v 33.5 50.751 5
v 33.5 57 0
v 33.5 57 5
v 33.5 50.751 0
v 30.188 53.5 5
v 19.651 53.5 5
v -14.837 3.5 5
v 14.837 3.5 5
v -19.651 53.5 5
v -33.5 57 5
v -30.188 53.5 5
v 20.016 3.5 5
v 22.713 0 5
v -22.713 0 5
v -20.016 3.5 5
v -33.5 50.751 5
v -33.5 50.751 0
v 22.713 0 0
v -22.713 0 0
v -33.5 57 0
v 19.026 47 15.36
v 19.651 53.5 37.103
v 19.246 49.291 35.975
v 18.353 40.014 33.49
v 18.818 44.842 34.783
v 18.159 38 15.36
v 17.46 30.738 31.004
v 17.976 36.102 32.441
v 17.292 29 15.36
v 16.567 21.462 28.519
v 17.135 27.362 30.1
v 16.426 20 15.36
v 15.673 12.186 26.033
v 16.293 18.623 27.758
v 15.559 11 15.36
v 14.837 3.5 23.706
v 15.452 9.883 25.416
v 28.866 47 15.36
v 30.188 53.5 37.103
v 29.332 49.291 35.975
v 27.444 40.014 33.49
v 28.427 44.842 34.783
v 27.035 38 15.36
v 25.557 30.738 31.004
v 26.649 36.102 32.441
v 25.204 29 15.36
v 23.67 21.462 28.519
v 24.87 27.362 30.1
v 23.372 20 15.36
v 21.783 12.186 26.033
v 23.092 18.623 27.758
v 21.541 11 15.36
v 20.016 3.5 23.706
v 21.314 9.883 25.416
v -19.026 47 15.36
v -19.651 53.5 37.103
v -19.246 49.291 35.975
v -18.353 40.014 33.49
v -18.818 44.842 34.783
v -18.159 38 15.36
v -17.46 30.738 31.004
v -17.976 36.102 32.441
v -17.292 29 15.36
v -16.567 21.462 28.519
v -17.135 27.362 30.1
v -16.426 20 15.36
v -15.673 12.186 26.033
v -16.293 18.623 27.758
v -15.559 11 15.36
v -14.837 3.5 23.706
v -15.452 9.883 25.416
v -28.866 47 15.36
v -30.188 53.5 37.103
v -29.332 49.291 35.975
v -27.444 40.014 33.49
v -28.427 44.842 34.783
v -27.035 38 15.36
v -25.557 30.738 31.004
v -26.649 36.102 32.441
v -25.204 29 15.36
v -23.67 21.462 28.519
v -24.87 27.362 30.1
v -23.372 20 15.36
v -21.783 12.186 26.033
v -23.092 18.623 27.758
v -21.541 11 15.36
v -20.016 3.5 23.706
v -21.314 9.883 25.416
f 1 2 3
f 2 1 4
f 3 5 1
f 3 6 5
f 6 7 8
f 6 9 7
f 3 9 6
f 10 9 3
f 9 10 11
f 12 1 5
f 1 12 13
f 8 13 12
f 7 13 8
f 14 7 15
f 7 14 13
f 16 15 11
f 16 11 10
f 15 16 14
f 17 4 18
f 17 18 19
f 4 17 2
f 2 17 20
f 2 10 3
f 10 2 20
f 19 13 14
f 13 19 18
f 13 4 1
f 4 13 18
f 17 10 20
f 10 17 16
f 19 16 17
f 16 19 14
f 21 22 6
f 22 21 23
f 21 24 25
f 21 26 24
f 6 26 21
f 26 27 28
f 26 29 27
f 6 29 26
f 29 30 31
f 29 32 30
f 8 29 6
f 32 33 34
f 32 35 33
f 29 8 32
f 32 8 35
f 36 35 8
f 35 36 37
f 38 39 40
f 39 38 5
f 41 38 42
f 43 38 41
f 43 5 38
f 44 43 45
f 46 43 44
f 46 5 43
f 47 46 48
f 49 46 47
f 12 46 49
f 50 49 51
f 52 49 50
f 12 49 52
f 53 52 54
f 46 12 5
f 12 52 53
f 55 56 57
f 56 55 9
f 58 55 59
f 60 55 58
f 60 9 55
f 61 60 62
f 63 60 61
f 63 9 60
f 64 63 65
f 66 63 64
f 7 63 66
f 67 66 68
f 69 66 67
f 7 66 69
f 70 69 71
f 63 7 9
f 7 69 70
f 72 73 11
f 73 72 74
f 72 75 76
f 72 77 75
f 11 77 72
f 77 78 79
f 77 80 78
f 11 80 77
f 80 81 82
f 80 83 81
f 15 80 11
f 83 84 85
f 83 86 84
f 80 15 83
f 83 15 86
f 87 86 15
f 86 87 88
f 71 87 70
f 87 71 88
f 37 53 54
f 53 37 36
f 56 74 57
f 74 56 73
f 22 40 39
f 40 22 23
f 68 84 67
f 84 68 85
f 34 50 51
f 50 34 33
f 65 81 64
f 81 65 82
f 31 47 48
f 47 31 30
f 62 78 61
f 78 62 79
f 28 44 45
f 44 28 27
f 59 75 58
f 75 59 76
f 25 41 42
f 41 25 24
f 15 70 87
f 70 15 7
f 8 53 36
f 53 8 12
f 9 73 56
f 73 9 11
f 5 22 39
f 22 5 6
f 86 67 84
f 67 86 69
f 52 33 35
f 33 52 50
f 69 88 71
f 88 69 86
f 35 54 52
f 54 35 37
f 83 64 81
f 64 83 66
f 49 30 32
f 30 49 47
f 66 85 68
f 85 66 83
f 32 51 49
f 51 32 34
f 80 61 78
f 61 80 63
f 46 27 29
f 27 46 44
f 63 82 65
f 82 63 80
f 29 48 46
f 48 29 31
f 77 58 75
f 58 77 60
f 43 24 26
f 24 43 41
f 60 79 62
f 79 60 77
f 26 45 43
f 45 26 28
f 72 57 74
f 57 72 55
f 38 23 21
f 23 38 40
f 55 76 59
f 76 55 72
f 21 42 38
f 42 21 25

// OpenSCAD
module arm() {
    union() {
        difference() {
            translate([14.5, 0, 0]) {
                rotate([0, 0, -5.5]) {
                    cube([12, 56, 40]);
                }
            }
            translate([19.1, -1, -1]) {
                rotate([0, 0, -11.5]) {
                    cube([15, 102, 102]);
                }
            }
        }
    }
}

module arms() {
    union() {
        difference() {
            union() {
                arm();
                mirror([1, 0, 0]) arm();
            }
            union() {
                translate([-50, -1, 22.5]) {
                    rotate([15, 0, 0]) {
                        cube([100, 100, 100]);
                    }
                }
                translate([-100, -1, -1]) {
                    cube([200, 4.5, 100]);
                }
                translate([-100, 53.5, -1]) {
                    cube([200, 10, 100]);
                }
            }
        }
    }
}

base_x = 67;
base_y = 57;
base_z = 5;

module half_base() {
    difference() {
        cube([base_x / 2, base_y, base_z]);
        translate([22.5, -1, -1]) {
            rotate([0, 0, -12]) {
                cube([100, 100, 100]);
            }
        }
    }
}

module base() {
    half_base();
    mirror([1, 0, 0]) half_base();
}


module core() {
    base();
    arms();
}

module chopper() {
    translate([0, 0, 79]) {
        scale([1, 1, 9]) {
            rotate([45, 0, 0]) {
                cube([base_x, 10, 10], center = true);
            }
        }
    }
}

difference() {
    core();
    union() {
        translate([0, 11, 0]) {
            chopper();
        }
        translate([0, 20, 0]) {
            chopper();
        }
        translate([0, 29, 0]) {
            chopper();
        }
        translate([0, 38, 0]) {
            chopper();
        }
        translate([0, 47, 0]) {
            chopper();
        }
    }
}
